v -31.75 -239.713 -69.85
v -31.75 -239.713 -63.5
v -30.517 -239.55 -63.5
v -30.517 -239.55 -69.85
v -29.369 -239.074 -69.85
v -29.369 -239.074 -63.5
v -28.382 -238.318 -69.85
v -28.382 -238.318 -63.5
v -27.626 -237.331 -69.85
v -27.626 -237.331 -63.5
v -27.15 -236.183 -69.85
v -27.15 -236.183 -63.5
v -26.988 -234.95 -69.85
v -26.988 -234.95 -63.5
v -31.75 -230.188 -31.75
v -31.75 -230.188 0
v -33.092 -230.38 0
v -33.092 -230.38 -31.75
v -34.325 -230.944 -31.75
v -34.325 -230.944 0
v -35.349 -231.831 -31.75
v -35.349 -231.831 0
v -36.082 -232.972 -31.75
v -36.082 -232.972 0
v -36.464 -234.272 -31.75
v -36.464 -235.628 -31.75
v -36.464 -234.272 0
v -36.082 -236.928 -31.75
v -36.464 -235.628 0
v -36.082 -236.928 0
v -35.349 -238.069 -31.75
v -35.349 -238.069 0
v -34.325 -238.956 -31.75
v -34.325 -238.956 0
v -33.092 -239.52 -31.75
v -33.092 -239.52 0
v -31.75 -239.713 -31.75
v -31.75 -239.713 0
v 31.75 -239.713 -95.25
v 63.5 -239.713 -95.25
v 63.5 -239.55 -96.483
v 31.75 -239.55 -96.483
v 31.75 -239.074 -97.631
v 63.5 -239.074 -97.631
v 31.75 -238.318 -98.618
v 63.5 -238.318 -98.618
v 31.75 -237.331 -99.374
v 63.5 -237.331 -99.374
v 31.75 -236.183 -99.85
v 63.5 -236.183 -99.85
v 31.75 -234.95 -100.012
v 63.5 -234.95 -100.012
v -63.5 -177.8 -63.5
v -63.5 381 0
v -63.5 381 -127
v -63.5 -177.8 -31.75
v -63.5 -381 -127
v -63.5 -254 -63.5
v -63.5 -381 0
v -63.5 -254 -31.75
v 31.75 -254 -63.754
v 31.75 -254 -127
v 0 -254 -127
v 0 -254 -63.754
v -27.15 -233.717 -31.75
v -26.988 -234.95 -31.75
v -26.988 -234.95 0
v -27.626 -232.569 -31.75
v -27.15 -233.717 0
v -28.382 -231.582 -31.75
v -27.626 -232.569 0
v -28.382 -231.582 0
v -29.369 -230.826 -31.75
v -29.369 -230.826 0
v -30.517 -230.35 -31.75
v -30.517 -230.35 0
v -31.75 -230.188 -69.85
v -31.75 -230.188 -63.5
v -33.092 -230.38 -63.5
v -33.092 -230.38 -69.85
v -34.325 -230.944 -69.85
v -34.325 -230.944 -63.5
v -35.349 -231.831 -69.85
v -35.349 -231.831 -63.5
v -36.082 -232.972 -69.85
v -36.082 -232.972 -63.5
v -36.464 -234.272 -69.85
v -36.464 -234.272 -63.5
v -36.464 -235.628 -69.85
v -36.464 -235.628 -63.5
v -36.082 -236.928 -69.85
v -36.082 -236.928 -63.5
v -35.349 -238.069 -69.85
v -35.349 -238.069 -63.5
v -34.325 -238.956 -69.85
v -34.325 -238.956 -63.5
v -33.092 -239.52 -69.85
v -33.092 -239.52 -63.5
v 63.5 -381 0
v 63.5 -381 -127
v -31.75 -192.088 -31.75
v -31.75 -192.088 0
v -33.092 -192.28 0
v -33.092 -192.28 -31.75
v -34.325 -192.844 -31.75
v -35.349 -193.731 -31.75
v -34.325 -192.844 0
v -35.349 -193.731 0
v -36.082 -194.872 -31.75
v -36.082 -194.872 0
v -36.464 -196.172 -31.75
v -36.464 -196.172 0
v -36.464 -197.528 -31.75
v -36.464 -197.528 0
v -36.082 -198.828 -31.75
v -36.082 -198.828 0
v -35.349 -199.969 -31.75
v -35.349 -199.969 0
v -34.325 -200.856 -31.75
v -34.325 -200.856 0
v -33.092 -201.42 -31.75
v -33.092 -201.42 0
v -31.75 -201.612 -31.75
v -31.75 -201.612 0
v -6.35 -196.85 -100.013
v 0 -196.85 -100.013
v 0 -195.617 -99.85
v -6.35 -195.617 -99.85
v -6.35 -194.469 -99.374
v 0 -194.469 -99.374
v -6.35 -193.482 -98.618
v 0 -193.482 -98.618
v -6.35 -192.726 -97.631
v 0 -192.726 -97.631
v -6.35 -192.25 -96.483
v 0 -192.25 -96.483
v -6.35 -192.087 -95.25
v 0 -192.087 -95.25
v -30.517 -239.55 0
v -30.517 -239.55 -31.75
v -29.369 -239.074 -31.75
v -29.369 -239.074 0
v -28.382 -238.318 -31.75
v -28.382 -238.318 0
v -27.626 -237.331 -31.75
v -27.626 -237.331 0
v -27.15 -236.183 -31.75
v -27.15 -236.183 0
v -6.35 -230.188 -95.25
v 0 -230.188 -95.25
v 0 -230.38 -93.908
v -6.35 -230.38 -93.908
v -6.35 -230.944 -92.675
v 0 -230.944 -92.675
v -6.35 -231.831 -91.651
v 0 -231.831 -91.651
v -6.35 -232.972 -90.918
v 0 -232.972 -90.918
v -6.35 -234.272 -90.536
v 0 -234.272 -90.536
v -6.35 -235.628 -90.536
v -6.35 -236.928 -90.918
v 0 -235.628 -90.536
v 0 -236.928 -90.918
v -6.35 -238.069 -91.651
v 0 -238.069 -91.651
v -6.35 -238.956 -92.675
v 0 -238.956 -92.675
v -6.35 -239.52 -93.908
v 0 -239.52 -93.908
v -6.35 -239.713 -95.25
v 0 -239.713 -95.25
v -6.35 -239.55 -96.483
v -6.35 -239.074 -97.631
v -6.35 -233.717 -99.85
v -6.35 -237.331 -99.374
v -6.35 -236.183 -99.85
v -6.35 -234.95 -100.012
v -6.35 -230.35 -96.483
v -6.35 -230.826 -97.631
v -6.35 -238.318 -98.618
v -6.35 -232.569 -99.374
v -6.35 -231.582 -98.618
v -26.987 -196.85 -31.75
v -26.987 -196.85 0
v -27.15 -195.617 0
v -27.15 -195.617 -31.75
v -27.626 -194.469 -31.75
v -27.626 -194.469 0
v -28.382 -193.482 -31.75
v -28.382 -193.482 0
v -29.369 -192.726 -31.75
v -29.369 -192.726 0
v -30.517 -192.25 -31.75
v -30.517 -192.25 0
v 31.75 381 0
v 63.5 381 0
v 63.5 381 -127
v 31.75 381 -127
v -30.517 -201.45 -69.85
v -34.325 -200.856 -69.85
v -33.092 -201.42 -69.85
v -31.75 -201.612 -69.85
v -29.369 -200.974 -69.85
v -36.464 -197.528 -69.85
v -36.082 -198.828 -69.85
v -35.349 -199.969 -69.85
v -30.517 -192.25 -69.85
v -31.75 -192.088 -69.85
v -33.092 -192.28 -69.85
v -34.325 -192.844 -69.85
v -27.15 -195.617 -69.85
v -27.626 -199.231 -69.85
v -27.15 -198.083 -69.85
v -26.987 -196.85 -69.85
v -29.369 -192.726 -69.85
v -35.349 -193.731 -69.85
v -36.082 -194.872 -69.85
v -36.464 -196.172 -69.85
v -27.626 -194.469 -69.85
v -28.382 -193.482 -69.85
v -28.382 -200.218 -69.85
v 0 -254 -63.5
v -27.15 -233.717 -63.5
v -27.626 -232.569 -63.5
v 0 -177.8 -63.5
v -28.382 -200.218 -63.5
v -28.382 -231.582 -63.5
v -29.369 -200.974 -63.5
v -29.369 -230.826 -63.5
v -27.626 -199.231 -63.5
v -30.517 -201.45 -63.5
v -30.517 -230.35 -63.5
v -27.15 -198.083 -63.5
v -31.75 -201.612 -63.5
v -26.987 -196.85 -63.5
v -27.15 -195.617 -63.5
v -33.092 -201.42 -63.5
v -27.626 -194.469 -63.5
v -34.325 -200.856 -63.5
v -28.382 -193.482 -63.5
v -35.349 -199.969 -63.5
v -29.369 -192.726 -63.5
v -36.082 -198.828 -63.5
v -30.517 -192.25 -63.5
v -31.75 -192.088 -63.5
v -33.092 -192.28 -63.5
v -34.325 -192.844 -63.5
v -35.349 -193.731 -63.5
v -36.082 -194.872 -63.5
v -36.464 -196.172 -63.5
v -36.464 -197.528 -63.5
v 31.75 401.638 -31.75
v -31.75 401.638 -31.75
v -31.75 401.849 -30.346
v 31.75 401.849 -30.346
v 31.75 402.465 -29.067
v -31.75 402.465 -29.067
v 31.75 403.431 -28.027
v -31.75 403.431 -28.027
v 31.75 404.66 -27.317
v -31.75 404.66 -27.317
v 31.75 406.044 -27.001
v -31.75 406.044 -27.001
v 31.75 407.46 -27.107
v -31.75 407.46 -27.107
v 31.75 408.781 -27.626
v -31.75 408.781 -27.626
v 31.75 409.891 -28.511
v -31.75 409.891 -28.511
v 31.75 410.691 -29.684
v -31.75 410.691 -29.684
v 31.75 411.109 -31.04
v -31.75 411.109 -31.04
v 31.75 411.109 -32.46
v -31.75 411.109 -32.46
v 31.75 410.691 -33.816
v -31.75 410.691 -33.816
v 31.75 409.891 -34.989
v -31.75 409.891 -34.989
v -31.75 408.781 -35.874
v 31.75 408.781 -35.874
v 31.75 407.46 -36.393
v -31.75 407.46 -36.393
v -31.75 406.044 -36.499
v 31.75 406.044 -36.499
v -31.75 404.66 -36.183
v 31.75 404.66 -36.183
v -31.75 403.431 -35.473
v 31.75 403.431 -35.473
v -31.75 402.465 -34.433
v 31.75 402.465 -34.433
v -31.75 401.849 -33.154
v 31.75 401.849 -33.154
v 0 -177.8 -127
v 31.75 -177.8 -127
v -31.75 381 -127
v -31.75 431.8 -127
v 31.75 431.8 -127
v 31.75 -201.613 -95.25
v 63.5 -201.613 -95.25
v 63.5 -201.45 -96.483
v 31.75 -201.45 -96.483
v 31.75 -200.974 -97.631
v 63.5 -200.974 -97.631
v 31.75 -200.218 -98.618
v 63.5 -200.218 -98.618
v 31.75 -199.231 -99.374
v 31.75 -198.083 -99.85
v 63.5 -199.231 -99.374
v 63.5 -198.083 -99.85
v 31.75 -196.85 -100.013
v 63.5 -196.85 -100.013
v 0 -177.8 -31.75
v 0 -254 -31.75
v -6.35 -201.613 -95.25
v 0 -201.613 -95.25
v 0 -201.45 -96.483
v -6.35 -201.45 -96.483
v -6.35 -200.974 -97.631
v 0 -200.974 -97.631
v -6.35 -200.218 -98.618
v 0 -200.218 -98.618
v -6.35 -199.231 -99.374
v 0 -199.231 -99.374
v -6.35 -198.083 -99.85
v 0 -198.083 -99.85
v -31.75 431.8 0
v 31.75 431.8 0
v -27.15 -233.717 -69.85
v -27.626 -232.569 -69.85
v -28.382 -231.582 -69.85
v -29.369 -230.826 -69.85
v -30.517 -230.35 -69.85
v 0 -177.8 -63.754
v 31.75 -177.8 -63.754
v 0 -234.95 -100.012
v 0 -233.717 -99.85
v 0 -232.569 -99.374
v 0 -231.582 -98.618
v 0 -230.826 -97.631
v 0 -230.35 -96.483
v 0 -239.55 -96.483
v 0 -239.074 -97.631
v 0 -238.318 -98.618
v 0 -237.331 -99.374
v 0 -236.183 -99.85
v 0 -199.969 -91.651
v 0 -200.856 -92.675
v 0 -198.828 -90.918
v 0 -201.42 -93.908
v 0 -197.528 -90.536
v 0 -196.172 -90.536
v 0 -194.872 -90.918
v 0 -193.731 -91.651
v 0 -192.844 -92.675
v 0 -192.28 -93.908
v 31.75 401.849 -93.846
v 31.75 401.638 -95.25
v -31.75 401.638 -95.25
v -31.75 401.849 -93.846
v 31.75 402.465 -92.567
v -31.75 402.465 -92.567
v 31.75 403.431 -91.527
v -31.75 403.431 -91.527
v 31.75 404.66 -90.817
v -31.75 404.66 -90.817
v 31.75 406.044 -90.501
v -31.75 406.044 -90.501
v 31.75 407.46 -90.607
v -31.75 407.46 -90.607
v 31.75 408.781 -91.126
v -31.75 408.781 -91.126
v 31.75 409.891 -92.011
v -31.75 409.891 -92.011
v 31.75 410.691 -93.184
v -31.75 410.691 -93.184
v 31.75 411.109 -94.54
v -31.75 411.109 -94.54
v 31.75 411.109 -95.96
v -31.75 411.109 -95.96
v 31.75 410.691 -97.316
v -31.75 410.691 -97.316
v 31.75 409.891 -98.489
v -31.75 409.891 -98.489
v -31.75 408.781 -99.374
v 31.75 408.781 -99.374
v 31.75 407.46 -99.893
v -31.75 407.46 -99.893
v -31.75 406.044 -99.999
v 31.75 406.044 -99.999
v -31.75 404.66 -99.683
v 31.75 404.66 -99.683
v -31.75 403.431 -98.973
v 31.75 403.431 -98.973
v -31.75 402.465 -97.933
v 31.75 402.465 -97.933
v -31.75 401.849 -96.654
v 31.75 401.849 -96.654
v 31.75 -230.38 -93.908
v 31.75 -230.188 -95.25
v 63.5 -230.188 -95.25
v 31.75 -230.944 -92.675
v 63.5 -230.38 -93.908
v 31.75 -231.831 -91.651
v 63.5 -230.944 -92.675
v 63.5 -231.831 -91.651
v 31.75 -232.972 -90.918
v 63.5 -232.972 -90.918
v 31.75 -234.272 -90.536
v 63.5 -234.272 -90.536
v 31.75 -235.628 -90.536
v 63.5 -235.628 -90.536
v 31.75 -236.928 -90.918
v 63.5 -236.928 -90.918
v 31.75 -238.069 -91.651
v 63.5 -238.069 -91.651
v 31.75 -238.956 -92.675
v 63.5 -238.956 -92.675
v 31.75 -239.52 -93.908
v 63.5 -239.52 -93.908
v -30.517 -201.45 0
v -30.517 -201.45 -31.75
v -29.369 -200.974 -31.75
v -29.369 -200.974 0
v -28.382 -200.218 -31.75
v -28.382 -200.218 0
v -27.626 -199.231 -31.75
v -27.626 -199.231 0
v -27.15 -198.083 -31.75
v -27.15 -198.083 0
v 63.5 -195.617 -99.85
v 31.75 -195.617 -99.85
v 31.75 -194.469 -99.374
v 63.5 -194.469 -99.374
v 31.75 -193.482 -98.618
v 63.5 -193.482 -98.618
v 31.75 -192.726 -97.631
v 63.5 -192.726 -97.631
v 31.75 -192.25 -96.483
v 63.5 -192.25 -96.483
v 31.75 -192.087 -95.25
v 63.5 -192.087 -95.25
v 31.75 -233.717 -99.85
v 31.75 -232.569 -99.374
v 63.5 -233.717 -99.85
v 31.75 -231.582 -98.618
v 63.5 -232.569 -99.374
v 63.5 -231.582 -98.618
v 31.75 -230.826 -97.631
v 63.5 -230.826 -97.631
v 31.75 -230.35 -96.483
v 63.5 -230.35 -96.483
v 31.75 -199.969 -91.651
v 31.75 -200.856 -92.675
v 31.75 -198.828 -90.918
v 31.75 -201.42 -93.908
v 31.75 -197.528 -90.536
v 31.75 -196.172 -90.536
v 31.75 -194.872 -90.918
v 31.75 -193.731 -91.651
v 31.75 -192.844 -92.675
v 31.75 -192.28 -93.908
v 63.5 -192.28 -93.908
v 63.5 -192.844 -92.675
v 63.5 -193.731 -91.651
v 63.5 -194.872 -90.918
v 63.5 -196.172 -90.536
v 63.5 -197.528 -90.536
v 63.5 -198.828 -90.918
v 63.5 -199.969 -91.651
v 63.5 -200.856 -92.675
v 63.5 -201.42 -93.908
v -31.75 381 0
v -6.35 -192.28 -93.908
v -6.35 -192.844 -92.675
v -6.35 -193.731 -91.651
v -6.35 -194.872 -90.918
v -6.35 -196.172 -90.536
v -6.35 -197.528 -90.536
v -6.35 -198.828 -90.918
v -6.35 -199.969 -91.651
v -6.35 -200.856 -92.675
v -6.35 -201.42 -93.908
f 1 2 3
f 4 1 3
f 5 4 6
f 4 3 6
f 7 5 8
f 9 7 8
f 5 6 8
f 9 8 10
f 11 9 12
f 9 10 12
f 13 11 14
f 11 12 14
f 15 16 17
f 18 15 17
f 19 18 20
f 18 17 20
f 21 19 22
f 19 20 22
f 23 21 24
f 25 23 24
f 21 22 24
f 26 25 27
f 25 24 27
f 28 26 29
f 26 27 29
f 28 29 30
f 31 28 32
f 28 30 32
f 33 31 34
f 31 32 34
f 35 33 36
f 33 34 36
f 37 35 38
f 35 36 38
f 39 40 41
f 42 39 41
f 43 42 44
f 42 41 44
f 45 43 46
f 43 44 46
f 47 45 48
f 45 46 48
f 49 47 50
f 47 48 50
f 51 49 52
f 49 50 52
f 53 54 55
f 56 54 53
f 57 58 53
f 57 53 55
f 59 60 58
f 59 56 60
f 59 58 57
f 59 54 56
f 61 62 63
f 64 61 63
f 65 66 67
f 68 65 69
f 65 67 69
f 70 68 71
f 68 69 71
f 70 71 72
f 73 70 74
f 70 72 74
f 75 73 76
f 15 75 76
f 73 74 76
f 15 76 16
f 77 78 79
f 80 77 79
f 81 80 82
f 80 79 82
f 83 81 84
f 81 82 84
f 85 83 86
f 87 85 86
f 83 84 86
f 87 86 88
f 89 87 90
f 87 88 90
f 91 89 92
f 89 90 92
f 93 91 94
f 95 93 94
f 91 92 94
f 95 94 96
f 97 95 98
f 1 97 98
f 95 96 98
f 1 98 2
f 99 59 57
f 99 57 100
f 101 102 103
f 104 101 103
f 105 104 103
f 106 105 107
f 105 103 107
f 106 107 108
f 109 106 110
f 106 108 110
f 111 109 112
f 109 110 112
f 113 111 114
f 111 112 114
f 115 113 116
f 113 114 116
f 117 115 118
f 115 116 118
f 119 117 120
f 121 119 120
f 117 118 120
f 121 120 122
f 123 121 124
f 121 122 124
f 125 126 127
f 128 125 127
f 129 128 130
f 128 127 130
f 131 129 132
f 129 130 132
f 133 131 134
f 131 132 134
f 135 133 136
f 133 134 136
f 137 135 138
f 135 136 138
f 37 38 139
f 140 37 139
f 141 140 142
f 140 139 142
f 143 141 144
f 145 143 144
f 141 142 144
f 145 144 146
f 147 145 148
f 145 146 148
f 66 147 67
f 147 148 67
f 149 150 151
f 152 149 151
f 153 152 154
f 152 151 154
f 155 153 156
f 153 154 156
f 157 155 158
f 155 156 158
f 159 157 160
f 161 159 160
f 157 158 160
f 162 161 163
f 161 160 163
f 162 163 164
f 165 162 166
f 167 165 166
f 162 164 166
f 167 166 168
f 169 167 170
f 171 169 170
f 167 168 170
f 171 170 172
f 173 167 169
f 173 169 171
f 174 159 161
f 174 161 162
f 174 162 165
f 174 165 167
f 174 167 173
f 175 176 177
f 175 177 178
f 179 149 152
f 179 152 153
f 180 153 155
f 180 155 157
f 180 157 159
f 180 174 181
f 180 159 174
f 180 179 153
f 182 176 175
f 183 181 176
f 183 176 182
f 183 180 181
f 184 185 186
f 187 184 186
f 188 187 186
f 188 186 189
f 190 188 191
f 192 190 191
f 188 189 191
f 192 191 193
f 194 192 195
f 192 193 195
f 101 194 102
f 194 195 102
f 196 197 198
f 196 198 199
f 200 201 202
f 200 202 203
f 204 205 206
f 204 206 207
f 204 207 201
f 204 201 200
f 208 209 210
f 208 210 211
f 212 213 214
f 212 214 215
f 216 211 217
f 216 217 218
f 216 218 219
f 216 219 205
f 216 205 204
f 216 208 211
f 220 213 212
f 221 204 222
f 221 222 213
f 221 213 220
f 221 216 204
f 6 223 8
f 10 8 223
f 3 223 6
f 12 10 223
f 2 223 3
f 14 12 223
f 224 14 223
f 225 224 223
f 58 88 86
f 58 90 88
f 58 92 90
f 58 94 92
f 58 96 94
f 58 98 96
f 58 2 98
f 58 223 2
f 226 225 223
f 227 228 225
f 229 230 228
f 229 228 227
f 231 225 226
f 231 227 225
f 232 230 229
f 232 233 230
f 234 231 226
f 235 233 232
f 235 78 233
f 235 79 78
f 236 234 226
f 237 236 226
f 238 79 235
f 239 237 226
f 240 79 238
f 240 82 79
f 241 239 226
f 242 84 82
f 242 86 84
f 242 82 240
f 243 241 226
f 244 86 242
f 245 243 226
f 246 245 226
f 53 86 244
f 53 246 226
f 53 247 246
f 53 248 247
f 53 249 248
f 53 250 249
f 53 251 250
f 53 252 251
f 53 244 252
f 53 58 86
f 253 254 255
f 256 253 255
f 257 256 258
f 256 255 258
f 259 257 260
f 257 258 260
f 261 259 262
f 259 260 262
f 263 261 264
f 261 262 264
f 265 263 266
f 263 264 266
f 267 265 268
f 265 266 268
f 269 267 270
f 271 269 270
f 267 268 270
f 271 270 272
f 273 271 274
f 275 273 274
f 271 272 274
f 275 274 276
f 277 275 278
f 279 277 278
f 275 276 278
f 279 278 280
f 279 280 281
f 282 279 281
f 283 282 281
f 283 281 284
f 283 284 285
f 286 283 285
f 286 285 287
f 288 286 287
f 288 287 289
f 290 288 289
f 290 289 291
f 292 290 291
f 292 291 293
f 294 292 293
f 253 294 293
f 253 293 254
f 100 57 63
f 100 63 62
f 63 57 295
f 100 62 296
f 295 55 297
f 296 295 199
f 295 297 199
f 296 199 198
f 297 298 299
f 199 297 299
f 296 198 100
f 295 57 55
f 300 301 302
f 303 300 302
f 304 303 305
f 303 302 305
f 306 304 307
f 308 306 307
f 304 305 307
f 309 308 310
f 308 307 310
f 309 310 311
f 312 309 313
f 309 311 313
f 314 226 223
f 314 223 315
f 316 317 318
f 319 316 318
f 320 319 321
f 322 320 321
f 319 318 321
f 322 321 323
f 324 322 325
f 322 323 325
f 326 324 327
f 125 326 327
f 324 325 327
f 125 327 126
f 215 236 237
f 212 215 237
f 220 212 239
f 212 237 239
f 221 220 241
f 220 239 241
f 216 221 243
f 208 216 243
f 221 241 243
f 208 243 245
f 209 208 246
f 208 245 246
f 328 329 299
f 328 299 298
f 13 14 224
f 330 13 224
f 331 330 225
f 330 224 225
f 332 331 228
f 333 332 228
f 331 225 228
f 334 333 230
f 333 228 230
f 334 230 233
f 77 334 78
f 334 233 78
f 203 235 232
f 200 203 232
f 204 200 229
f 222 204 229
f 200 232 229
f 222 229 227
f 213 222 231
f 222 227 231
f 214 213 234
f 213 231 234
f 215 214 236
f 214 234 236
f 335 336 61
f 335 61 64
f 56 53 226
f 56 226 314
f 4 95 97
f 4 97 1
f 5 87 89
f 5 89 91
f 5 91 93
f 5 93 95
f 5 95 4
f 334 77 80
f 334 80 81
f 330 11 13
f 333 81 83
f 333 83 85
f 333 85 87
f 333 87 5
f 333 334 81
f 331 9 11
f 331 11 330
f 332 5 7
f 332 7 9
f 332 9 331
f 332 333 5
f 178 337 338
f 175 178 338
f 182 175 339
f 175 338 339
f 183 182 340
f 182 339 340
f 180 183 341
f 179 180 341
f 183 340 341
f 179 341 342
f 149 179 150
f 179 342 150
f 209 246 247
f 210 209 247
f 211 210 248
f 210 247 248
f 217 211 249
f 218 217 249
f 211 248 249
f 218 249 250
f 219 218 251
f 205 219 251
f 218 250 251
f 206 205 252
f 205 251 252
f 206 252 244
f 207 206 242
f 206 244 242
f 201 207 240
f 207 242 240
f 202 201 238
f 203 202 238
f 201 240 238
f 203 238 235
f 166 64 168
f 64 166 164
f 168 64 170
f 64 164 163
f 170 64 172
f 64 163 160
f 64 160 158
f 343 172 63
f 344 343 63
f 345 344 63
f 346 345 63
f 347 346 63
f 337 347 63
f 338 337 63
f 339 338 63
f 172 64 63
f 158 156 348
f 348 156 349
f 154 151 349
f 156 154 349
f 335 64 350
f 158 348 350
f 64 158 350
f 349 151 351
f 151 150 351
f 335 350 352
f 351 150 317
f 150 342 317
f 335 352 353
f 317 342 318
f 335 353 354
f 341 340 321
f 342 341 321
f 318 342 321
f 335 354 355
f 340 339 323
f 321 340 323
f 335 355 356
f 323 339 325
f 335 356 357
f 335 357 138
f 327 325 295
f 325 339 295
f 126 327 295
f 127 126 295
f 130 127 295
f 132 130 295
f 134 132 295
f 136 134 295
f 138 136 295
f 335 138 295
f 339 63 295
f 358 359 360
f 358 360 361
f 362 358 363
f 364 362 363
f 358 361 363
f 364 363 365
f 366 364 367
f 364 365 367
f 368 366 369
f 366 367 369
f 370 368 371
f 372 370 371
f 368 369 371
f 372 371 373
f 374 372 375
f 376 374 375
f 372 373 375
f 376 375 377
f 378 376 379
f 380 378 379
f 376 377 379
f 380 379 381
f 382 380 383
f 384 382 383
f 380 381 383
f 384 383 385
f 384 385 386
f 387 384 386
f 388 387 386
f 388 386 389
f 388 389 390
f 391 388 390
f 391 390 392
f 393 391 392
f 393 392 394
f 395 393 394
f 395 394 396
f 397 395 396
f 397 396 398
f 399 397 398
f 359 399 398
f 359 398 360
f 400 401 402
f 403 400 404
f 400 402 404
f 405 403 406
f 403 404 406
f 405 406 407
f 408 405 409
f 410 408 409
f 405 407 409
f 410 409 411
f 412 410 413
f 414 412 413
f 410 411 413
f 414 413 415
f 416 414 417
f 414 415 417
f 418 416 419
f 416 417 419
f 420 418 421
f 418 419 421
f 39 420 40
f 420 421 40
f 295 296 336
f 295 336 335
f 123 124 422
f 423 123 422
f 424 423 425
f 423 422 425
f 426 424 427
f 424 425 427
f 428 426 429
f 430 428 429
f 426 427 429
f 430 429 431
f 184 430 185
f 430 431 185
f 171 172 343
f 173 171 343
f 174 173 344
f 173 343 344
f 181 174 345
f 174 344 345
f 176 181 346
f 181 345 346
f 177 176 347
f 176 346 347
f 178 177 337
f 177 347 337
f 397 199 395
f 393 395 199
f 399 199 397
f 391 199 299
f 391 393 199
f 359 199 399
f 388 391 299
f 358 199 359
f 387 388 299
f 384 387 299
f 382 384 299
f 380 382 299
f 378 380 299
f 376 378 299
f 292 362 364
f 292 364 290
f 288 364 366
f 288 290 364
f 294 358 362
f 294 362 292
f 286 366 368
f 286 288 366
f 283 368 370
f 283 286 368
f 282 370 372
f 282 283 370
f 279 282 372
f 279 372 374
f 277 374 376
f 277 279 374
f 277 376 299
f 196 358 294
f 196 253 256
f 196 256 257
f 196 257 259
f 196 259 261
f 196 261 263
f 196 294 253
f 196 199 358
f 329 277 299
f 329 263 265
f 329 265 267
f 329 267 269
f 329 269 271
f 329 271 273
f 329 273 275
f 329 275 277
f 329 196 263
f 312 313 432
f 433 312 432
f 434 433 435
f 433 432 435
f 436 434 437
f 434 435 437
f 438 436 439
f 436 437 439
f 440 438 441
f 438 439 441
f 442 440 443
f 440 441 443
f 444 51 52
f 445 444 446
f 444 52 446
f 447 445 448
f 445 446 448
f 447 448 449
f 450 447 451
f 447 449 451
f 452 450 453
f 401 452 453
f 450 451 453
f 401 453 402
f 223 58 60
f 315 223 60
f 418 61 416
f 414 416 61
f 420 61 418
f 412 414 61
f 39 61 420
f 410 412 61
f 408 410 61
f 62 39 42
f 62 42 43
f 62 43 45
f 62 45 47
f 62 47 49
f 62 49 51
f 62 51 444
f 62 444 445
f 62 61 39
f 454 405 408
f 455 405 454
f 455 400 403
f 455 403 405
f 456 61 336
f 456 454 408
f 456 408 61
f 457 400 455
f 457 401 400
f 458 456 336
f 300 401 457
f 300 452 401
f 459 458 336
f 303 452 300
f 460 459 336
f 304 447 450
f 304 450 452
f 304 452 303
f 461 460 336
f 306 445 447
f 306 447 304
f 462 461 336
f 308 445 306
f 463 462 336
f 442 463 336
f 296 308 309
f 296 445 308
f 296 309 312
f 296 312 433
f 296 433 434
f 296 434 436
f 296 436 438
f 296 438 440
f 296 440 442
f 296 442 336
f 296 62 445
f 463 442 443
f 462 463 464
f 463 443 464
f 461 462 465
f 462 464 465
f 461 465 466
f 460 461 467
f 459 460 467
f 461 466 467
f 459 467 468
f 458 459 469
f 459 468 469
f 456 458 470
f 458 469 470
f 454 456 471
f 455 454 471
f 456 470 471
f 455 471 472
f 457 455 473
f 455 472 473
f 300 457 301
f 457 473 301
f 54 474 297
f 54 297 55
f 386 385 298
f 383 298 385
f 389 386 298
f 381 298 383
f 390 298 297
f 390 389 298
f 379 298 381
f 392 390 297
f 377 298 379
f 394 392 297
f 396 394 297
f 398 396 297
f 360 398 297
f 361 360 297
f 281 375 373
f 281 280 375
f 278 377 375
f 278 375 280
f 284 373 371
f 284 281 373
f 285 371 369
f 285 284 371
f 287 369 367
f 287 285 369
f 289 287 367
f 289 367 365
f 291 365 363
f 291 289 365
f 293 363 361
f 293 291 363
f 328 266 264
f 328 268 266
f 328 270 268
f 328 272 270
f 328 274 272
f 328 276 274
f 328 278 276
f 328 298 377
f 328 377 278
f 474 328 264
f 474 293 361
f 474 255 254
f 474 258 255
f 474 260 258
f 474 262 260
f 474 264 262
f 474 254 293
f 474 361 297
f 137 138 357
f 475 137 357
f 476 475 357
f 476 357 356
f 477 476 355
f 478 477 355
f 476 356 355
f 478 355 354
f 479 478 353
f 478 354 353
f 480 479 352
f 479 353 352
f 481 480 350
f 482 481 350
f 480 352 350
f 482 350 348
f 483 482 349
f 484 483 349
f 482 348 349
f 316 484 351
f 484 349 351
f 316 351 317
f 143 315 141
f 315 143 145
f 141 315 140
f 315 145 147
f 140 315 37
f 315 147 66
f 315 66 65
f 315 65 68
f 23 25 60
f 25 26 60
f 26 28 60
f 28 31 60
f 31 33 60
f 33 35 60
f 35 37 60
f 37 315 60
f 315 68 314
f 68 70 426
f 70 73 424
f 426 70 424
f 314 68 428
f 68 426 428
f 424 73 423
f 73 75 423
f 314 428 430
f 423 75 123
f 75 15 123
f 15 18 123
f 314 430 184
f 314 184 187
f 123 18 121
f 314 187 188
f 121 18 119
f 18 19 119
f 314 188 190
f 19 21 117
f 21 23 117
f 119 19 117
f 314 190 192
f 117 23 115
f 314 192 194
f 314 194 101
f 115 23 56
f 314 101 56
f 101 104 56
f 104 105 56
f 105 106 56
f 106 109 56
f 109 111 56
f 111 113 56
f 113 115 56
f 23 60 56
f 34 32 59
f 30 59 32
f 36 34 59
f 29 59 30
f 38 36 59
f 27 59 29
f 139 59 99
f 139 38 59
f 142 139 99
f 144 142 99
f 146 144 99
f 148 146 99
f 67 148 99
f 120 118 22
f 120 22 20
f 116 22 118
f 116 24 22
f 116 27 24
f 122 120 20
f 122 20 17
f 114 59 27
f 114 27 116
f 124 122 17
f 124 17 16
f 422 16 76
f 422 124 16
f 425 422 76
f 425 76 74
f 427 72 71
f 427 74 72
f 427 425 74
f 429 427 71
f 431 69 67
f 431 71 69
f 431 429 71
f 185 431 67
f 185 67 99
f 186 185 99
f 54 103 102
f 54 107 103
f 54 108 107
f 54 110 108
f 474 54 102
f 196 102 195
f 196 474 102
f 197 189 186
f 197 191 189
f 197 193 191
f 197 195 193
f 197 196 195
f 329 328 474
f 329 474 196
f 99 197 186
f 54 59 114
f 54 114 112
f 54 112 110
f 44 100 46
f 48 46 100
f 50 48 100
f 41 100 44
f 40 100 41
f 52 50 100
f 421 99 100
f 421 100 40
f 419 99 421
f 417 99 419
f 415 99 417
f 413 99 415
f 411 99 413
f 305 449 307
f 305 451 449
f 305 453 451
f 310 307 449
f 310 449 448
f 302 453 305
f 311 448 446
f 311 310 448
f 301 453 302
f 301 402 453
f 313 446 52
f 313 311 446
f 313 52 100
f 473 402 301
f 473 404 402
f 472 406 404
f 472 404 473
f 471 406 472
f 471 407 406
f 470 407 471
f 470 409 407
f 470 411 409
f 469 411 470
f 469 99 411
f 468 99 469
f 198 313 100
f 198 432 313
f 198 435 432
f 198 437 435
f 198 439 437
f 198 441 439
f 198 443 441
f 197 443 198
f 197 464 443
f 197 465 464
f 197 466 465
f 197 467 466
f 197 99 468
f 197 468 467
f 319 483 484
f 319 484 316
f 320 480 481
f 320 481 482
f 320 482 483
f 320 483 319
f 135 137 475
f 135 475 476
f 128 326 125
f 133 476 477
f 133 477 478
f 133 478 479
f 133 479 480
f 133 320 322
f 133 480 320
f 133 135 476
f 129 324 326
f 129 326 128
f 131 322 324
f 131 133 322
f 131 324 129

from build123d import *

# Parameters (mm, degrees)
BOSS_EXTRUDE1_DEPTH = 127
SKETCH4_W           = 31.75
SKETCH4_H           = 76.2
CUT_EXTRUDE3_DEPTH  = 63.5
SKETCH5_W           = 31.75
SKETCH5_H           = 76.2
CUT_EXTRUDE4_DEPTH  = 63.246
CUT_EXTRUDE6_DEPTH  = 69.85
CUT_EXTRUDE8_DEPTH  = 69.85
SKETCH9_R           = 4.7625
CUT_EXTRUDE9_DEPTH  = 461.057390442


with BuildPart() as part:
    # Sketch1 → Boss-Extrude1 (new body)
    with BuildSketch(Plane.XY):
        Polygon((63.5, -381), (63.5, 381), (31.75, 381), (31.75, 431.8), (-31.75, 431.8), (-31.75, 381), (-63.5, 381), (-63.5, -381), align=None)
    extrude(amount=-BOSS_EXTRUDE1_DEPTH)

    # Sketch4 → Cut-Extrude3 (cut)
    with BuildSketch(Plane.ZY.offset(63.5)):
        with Locations((-47.625, -215.9)):
            Rectangle(SKETCH4_W, SKETCH4_H)
    extrude(amount=-CUT_EXTRUDE3_DEPTH, mode=Mode.SUBTRACT)

    # Sketch5 → Cut-Extrude4 (cut)
    with BuildSketch(Plane(origin=(0, 0, -127), x_dir=(-1, 0, 0), z_dir=(0, 0, -1))):
        with Locations((-15.875, -215.9)):
            Rectangle(SKETCH5_W, SKETCH5_H)
    extrude(amount=-CUT_EXTRUDE4_DEPTH, mode=Mode.SUBTRACT)

    # Sketch7 → Cut-Extrude6 (cut)
    with BuildSketch(Plane(origin=(63.5, 0, 0), x_dir=(0, 0, -1), z_dir=(1, 0, 0))):
        with BuildLine():
            ThreePointArc((100.0125, -234.95), (98.617596045, -231.582403955), (95.25, -230.1875))
            Line((95.25, -230.1875), (95.25, -239.7125))
            ThreePointArc((95.25, -239.7125), (98.617596045, -238.317596045), (100.0125, -234.95))
        make_face()
        with BuildLine():
            Line((95.25, -239.7125), (95.25, -230.1875))
            ThreePointArc((95.25, -230.1875), (90.4875, -234.95), (95.25, -239.7125))
        make_face()
        with BuildLine():
            ThreePointArc((100.0125, -196.85), (98.617596045, -193.482403955), (95.25, -192.0875))
            Line((95.25, -192.0875), (95.25, -201.6125))
            ThreePointArc((95.25, -201.6125), (98.617596045, -200.217596045), (100.0125, -196.85))
        make_face()
        with BuildLine():
            Line((95.25, -201.6125), (95.25, -192.0875))
            ThreePointArc((95.25, -192.0875), (90.4875, -196.85), (95.25, -201.6125))
        make_face()
    extrude(amount=-CUT_EXTRUDE6_DEPTH, mode=Mode.SUBTRACT)

    # Sketch8 → Cut-Extrude8 (cut)
    with BuildSketch(Plane.XY):
        with BuildLine():
            ThreePointArc((-26.9875, -234.95), (-28.382403955, -231.582403955), (-31.75, -230.1875))
            Line((-31.75, -230.1875), (-31.75, -239.7125))
            ThreePointArc((-31.75, -239.7125), (-28.382403955, -238.317596045), (-26.9875, -234.95))
        make_face()
        with BuildLine():
            Line((-31.75, -239.7125), (-31.75, -230.1875))
            ThreePointArc((-31.75, -230.1875), (-36.5125, -234.95), (-31.75, -239.7125))
        make_face()
        with BuildLine():
            ThreePointArc((-26.9875, -196.85), (-28.382403955, -193.482403955), (-31.75, -192.0875))
            Line((-31.75, -192.0875), (-31.75, -201.6125))
            ThreePointArc((-31.75, -201.6125), (-28.382403955, -200.217596045), (-26.9875, -196.85))
        make_face()
        with BuildLine():
            Line((-31.75, -201.6125), (-31.75, -192.0875))
            ThreePointArc((-31.75, -192.0875), (-36.5125, -196.85), (-31.75, -201.6125))
        make_face()
    extrude(amount=-CUT_EXTRUDE8_DEPTH, mode=Mode.SUBTRACT)

    # Sketch9 → Cut-Extrude9 (cut, through all)
    with BuildSketch(Plane.ZY.offset(31.75)):
        with Locations(Location((-95.25, 406.4, 0), (0, 0, 270))):
            Circle(SKETCH9_R)
        with Locations(Location((-31.75, 406.4, 0), (0, 0, 270))):
            Circle(SKETCH9_R)
    extrude(amount=-CUT_EXTRUDE9_DEPTH, mode=Mode.SUBTRACT)


solid = part.part
